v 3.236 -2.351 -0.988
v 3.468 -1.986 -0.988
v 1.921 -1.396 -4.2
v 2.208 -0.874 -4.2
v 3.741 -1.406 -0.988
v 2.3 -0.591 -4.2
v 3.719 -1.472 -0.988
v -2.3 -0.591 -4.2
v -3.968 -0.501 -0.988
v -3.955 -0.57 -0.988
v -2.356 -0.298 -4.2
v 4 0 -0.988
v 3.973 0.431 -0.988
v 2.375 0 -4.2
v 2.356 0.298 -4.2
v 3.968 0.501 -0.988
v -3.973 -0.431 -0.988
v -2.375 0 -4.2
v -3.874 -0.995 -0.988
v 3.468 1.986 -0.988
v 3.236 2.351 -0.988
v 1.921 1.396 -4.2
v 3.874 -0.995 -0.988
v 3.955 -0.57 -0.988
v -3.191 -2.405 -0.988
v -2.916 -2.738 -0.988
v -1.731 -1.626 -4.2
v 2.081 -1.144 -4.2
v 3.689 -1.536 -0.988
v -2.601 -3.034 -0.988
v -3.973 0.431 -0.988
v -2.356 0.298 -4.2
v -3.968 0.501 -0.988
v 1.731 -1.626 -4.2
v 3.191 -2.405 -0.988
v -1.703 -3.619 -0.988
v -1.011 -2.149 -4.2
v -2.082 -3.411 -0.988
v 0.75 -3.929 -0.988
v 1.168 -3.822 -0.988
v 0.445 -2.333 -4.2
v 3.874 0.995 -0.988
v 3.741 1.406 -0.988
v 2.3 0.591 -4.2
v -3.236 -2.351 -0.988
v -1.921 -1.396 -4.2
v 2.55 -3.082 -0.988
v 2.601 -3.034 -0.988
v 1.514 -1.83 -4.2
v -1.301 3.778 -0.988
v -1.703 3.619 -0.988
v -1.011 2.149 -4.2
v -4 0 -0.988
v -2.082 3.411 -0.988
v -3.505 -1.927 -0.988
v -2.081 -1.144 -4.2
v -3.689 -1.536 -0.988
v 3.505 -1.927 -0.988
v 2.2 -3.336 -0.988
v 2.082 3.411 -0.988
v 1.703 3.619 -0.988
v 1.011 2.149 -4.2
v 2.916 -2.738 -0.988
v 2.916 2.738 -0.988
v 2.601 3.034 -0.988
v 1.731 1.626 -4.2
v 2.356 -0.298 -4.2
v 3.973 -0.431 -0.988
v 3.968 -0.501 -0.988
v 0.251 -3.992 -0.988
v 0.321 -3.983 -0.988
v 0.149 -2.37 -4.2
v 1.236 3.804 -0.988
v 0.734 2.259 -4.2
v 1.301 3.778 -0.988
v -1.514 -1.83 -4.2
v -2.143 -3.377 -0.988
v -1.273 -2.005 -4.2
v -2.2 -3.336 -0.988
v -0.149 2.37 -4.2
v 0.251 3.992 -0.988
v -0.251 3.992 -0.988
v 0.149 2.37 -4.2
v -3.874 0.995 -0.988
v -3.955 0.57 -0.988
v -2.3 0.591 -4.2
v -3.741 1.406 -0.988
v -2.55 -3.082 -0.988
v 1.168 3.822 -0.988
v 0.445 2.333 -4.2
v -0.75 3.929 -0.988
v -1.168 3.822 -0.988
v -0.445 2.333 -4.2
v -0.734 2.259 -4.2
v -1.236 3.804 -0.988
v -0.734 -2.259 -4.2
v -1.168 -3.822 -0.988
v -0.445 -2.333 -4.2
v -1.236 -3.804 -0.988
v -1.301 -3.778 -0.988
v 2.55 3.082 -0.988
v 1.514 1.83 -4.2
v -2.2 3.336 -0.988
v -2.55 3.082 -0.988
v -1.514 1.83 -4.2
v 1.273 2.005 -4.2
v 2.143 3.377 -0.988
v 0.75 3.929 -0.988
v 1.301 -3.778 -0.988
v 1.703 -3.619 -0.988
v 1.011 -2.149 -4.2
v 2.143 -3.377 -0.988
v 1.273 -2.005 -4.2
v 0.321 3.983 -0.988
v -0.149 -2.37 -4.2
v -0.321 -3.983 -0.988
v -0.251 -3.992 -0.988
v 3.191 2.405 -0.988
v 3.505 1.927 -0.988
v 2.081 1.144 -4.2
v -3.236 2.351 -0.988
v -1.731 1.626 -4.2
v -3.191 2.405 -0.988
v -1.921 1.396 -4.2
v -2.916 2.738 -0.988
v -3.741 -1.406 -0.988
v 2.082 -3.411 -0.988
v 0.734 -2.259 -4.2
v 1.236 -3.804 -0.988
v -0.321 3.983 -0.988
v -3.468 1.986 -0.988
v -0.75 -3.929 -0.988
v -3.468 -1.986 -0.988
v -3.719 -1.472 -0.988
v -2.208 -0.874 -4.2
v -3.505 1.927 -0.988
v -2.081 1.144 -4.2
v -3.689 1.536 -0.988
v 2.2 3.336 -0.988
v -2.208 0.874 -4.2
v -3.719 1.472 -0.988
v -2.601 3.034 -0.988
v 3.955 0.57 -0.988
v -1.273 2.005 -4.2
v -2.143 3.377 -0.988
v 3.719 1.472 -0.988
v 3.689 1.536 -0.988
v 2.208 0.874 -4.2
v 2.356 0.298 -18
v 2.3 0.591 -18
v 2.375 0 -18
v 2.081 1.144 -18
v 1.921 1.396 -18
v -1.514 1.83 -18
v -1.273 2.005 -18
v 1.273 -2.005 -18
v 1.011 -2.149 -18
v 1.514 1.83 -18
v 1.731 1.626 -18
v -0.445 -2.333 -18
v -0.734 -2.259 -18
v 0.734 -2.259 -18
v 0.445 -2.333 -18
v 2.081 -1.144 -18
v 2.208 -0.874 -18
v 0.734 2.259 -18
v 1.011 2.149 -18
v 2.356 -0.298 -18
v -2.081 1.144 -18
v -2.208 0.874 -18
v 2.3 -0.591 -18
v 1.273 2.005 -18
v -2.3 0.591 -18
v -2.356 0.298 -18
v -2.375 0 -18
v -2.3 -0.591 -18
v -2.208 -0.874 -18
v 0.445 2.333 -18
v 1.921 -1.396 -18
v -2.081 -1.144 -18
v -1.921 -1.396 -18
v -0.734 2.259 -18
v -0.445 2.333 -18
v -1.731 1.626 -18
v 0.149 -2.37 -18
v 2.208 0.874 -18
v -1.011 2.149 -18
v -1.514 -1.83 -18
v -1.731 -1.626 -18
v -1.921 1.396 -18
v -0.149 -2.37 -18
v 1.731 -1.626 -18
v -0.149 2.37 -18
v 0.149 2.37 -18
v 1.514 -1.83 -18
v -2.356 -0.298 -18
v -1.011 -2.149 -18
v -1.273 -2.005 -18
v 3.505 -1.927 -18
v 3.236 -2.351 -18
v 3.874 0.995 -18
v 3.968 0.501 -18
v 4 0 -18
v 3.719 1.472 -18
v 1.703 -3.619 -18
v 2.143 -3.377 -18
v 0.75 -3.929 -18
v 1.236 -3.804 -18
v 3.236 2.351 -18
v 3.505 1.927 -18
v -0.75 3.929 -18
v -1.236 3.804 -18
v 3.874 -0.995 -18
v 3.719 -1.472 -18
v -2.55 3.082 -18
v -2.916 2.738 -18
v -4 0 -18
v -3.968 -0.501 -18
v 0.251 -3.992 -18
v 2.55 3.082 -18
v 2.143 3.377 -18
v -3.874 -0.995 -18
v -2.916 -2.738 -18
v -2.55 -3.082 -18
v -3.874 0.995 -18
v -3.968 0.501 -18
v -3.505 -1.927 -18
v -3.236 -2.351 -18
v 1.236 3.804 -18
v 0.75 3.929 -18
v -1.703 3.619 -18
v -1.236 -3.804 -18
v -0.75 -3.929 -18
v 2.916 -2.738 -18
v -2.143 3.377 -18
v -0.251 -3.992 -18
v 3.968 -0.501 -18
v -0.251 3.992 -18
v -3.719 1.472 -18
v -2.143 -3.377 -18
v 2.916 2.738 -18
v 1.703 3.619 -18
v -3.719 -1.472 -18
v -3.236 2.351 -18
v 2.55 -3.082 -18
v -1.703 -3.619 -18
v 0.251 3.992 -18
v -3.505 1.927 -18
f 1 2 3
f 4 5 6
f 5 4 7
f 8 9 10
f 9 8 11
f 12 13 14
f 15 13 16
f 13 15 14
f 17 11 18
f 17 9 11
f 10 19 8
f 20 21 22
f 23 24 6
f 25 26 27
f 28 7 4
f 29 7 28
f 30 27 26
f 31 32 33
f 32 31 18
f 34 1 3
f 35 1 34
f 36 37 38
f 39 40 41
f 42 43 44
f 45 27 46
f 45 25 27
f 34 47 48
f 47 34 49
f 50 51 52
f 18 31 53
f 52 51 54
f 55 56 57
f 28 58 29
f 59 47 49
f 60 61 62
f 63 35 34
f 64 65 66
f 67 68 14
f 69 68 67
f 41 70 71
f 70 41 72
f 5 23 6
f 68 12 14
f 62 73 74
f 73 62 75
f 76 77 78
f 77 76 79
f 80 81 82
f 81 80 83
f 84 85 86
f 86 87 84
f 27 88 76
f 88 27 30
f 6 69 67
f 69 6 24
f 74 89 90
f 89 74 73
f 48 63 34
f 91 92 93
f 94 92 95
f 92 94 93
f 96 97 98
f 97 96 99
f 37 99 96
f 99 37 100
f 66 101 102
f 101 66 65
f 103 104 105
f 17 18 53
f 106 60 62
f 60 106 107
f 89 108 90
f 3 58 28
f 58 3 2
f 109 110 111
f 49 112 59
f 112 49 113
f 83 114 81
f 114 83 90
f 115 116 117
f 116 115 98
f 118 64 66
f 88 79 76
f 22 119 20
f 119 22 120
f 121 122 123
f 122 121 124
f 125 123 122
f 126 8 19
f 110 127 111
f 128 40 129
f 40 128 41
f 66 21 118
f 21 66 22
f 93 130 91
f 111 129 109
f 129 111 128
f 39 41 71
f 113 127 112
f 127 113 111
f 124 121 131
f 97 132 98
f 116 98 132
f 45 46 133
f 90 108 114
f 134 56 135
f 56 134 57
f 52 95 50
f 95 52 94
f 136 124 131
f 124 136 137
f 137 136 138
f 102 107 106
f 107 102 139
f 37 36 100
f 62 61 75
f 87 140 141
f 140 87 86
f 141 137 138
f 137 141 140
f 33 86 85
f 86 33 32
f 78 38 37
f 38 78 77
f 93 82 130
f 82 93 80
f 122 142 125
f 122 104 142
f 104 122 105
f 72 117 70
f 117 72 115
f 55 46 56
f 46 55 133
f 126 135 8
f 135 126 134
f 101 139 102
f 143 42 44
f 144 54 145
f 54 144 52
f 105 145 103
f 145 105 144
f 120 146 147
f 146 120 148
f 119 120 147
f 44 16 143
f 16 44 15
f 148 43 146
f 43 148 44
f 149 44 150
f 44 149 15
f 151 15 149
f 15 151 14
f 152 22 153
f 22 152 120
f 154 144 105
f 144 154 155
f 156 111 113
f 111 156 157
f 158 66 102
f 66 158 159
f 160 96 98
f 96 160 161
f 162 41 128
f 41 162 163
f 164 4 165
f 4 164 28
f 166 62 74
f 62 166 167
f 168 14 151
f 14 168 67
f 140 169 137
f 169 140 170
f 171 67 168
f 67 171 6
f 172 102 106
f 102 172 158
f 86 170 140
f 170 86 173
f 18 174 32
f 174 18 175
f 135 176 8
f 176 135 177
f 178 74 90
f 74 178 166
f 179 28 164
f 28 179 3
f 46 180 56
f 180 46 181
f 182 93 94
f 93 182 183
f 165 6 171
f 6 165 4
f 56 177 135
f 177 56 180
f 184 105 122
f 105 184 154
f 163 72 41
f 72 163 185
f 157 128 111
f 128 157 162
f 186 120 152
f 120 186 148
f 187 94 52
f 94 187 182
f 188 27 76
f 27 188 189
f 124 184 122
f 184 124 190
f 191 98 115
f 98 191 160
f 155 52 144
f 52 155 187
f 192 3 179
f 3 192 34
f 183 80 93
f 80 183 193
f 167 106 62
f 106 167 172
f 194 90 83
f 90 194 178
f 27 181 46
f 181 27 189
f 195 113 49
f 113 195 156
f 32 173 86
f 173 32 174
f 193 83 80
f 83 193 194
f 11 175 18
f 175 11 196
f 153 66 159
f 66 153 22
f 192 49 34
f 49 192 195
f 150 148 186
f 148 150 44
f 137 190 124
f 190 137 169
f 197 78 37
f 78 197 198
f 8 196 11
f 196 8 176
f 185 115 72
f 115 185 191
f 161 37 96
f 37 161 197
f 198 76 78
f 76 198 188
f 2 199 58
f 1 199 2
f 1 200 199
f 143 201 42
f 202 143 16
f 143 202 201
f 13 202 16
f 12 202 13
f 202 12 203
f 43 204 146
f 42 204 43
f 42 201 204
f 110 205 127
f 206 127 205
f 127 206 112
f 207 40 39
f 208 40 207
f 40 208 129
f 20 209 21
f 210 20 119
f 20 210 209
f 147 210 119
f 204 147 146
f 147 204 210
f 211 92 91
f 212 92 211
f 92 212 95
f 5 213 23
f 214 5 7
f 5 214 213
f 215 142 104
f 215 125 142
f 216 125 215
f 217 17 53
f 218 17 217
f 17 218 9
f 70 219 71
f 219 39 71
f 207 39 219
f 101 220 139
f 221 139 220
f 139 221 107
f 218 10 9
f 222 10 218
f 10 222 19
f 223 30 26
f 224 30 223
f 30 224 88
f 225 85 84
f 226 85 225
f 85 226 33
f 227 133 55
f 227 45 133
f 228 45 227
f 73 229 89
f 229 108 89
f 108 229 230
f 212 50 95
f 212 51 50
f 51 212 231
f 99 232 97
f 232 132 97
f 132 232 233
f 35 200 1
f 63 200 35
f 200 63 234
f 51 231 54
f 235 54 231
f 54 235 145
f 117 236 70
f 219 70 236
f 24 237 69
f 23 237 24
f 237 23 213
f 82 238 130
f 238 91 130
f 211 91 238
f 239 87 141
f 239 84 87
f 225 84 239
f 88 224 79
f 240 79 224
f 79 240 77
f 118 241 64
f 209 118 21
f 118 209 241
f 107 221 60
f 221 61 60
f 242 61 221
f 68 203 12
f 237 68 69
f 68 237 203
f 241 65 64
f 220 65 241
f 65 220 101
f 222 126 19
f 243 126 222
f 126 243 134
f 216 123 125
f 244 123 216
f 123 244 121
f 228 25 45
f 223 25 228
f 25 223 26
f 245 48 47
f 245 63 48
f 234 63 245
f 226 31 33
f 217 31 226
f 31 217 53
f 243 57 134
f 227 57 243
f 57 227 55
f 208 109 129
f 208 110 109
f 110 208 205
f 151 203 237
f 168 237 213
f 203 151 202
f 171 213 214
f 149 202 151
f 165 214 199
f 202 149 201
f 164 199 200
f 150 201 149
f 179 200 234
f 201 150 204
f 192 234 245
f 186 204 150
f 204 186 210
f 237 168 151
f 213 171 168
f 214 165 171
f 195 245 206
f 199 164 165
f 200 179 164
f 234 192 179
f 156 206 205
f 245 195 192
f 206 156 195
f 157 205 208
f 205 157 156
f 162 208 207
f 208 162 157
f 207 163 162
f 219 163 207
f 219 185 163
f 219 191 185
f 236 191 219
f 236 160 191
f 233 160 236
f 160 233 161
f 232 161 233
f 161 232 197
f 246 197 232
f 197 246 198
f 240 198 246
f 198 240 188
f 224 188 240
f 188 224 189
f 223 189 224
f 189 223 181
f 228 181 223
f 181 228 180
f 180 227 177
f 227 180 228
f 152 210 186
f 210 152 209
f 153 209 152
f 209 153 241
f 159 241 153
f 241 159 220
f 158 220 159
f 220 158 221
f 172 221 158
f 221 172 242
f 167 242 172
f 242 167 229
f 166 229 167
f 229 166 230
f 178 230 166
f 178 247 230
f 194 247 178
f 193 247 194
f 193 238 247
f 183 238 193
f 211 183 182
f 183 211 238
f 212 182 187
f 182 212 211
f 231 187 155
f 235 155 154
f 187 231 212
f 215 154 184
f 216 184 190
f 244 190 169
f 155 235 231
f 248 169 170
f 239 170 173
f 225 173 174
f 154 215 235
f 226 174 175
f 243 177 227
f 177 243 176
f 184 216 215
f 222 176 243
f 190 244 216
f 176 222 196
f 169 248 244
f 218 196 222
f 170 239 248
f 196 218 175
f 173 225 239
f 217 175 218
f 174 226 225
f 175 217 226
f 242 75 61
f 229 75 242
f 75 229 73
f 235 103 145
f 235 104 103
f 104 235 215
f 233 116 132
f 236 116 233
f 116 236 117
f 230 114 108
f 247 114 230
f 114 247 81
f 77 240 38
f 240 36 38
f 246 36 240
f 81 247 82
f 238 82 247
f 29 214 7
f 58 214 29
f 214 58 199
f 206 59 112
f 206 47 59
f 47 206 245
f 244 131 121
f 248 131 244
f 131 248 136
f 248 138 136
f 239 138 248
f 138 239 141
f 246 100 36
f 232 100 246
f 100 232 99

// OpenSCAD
$fn = 50;

difference() {
	union() {
		translate(v = [0, 0, -18.0]) {
			cylinder(h = 21, r = 4.0);
		}
	}
	union() {
		translate(v = [0, 0, 0]) {
			rotate(a = [0, 0, 0]) {
				difference() {
					union() {
						translate(v = [0, 0, -21.0]) {
							cylinder(h = 21, r = 2.25);
						}
						translate(v = [0, 0, -4.2]) {
							cylinder(h = 4.2, r1 = 2.375, r2 = 4.5);
						}
						translate(v = [0, 0, -21.0]) {
							cylinder(h = 21, r = 2.375);
						}
						translate(v = [0, 0, -21.0]) {
							cylinder(h = 21, r = 2.25);
						}
					}
					union();
				}
			}
		}
		#cylinder(h = 3, r = 5.0);
	}
}
